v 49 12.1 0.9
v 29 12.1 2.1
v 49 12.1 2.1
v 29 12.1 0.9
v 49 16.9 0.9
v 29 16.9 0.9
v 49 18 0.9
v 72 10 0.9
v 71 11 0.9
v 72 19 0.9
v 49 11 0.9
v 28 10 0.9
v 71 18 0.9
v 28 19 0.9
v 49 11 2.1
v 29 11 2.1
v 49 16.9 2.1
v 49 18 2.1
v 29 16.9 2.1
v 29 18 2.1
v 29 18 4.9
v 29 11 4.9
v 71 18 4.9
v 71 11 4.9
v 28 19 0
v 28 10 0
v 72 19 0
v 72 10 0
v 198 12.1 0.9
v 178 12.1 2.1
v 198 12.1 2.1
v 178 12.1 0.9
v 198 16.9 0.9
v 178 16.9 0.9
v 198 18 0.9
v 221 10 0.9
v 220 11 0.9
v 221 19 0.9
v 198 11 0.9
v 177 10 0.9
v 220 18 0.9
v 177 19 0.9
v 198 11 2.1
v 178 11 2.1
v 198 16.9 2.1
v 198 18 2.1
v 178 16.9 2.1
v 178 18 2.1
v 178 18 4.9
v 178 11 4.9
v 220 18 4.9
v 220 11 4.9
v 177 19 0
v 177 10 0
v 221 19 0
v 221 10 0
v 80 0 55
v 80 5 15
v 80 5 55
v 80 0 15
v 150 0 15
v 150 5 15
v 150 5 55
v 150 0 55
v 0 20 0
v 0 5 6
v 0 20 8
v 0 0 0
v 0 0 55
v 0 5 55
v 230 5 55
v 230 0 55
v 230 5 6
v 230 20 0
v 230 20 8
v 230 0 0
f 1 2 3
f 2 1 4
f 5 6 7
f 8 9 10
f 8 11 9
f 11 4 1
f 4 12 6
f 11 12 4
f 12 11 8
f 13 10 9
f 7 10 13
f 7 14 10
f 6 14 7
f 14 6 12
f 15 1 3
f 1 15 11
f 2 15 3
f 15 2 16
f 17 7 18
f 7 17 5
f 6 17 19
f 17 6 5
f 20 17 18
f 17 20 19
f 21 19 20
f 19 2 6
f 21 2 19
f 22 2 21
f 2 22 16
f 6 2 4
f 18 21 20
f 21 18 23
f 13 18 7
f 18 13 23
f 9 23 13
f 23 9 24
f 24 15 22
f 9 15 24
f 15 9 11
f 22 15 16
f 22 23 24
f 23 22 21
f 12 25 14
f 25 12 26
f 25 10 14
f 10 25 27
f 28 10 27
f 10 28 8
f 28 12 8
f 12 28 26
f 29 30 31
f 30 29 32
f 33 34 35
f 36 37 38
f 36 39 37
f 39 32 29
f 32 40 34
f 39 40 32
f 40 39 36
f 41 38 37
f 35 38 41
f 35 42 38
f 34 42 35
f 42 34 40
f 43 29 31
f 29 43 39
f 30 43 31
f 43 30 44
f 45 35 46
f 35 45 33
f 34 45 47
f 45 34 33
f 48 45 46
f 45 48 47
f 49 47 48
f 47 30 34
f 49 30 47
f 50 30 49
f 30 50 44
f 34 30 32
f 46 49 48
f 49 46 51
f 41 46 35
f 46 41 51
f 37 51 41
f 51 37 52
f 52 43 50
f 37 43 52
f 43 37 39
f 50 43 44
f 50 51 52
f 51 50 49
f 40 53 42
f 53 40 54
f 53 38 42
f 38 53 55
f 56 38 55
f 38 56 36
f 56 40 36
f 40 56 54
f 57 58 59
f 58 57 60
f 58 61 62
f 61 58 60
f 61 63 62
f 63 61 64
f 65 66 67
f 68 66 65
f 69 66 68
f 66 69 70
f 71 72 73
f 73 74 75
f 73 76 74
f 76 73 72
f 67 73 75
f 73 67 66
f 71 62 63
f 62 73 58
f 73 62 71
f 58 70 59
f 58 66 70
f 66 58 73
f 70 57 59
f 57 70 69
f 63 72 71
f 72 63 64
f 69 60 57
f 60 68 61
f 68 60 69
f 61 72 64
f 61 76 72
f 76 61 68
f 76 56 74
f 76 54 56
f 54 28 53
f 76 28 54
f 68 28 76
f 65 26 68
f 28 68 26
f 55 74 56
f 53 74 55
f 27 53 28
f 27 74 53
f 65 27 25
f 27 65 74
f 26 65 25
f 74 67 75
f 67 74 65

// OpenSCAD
barLength = 230; // 230
barDepth = 20;

backDepth = 5;
backHeight = 55;

frontHeight = 8;
frontJoinHeight = 6;

gapLength = 70;
gapBase = 15;

gripLength = 42;
gripDepth = 7;
gripHeight = 5;

gripSlideLength = 20;
gripSlideDepth = 1;
gripSlideHeight = 1;

module barProfile() {
    polygon([
        [0, 0],
        [barDepth, 0],
        [barDepth, frontHeight],
        [backDepth, frontJoinHeight],
        [backDepth, backHeight],
        [0, backHeight]
    ]);
}

module bar() {
    linear_extrude(barLength) barProfile();
}

module gapProfile() {
    polygon([
        [-1, gapBase],
        [backDepth + 1, gapBase],
        [backDepth + 1, backHeight + 1],
        [-1, backHeight + 1]
    ]);
}

module gap() {
    translate([0,0,(barLength - gapLength) / 2.0])
        linear_extrude(gapLength) gapProfile();
}

module gripInsetProfile() {
    polygon([
        [0, 0],
        [gripDepth + 2, 0],
        [gripDepth + 2, 1],
        [0, 1]
    ]);
}

module gripInset() {
    linear_extrude(gripLength + 2) gripInsetProfile();
}

module gripSlideProfile() {
    polygon([
        [0, 0],
        [gripSlideDepth + 0.2, 0],
        [gripSlideDepth + 0.2, gripSlideHeight + 0.2],
        [0, gripSlideHeight + 0.2]
    ]);
}

module gripSlide() {
    translate([0,0,-0.1])
        linear_extrude(gripSlideLength + 0.1) gripSlideProfile();
}

module gripBlockProfile() {
    polygon([
        [0, 0],
        [gripDepth, 0],
        [gripDepth, gripHeight],
        [0, gripHeight]
    ]);
}

module gripBlock() {
    difference() {
        linear_extrude(gripLength) gripBlockProfile();
        translate([-0.1, 1.0, 0])
            union() {
                gripSlide();
                translate([gripDepth - gripSlideDepth, 0, 0]) gripSlide();
            };
    }
}

module grip() {
    color("red")
    union() {
        gripInset();
        translate([1, 0, 1]) gripBlock();
    }
}

module adaptor() {
    difference() {
        bar();
        union() {
            translate([10, -0.1, 28]) grip();
            translate([10, -0.1, 177]) grip();
            gap();
        }
    }
}

module original() {
    color("blue")
    rotate([-90,0,0])
    translate([barLength / 2.0, 4, 10.4])
    import("soundbar-v1.stl");
}

//difference() {
    rotate([90,0,90]) adaptor();
//    original();
//}

//rotate([90,0,90]) adaptor();
